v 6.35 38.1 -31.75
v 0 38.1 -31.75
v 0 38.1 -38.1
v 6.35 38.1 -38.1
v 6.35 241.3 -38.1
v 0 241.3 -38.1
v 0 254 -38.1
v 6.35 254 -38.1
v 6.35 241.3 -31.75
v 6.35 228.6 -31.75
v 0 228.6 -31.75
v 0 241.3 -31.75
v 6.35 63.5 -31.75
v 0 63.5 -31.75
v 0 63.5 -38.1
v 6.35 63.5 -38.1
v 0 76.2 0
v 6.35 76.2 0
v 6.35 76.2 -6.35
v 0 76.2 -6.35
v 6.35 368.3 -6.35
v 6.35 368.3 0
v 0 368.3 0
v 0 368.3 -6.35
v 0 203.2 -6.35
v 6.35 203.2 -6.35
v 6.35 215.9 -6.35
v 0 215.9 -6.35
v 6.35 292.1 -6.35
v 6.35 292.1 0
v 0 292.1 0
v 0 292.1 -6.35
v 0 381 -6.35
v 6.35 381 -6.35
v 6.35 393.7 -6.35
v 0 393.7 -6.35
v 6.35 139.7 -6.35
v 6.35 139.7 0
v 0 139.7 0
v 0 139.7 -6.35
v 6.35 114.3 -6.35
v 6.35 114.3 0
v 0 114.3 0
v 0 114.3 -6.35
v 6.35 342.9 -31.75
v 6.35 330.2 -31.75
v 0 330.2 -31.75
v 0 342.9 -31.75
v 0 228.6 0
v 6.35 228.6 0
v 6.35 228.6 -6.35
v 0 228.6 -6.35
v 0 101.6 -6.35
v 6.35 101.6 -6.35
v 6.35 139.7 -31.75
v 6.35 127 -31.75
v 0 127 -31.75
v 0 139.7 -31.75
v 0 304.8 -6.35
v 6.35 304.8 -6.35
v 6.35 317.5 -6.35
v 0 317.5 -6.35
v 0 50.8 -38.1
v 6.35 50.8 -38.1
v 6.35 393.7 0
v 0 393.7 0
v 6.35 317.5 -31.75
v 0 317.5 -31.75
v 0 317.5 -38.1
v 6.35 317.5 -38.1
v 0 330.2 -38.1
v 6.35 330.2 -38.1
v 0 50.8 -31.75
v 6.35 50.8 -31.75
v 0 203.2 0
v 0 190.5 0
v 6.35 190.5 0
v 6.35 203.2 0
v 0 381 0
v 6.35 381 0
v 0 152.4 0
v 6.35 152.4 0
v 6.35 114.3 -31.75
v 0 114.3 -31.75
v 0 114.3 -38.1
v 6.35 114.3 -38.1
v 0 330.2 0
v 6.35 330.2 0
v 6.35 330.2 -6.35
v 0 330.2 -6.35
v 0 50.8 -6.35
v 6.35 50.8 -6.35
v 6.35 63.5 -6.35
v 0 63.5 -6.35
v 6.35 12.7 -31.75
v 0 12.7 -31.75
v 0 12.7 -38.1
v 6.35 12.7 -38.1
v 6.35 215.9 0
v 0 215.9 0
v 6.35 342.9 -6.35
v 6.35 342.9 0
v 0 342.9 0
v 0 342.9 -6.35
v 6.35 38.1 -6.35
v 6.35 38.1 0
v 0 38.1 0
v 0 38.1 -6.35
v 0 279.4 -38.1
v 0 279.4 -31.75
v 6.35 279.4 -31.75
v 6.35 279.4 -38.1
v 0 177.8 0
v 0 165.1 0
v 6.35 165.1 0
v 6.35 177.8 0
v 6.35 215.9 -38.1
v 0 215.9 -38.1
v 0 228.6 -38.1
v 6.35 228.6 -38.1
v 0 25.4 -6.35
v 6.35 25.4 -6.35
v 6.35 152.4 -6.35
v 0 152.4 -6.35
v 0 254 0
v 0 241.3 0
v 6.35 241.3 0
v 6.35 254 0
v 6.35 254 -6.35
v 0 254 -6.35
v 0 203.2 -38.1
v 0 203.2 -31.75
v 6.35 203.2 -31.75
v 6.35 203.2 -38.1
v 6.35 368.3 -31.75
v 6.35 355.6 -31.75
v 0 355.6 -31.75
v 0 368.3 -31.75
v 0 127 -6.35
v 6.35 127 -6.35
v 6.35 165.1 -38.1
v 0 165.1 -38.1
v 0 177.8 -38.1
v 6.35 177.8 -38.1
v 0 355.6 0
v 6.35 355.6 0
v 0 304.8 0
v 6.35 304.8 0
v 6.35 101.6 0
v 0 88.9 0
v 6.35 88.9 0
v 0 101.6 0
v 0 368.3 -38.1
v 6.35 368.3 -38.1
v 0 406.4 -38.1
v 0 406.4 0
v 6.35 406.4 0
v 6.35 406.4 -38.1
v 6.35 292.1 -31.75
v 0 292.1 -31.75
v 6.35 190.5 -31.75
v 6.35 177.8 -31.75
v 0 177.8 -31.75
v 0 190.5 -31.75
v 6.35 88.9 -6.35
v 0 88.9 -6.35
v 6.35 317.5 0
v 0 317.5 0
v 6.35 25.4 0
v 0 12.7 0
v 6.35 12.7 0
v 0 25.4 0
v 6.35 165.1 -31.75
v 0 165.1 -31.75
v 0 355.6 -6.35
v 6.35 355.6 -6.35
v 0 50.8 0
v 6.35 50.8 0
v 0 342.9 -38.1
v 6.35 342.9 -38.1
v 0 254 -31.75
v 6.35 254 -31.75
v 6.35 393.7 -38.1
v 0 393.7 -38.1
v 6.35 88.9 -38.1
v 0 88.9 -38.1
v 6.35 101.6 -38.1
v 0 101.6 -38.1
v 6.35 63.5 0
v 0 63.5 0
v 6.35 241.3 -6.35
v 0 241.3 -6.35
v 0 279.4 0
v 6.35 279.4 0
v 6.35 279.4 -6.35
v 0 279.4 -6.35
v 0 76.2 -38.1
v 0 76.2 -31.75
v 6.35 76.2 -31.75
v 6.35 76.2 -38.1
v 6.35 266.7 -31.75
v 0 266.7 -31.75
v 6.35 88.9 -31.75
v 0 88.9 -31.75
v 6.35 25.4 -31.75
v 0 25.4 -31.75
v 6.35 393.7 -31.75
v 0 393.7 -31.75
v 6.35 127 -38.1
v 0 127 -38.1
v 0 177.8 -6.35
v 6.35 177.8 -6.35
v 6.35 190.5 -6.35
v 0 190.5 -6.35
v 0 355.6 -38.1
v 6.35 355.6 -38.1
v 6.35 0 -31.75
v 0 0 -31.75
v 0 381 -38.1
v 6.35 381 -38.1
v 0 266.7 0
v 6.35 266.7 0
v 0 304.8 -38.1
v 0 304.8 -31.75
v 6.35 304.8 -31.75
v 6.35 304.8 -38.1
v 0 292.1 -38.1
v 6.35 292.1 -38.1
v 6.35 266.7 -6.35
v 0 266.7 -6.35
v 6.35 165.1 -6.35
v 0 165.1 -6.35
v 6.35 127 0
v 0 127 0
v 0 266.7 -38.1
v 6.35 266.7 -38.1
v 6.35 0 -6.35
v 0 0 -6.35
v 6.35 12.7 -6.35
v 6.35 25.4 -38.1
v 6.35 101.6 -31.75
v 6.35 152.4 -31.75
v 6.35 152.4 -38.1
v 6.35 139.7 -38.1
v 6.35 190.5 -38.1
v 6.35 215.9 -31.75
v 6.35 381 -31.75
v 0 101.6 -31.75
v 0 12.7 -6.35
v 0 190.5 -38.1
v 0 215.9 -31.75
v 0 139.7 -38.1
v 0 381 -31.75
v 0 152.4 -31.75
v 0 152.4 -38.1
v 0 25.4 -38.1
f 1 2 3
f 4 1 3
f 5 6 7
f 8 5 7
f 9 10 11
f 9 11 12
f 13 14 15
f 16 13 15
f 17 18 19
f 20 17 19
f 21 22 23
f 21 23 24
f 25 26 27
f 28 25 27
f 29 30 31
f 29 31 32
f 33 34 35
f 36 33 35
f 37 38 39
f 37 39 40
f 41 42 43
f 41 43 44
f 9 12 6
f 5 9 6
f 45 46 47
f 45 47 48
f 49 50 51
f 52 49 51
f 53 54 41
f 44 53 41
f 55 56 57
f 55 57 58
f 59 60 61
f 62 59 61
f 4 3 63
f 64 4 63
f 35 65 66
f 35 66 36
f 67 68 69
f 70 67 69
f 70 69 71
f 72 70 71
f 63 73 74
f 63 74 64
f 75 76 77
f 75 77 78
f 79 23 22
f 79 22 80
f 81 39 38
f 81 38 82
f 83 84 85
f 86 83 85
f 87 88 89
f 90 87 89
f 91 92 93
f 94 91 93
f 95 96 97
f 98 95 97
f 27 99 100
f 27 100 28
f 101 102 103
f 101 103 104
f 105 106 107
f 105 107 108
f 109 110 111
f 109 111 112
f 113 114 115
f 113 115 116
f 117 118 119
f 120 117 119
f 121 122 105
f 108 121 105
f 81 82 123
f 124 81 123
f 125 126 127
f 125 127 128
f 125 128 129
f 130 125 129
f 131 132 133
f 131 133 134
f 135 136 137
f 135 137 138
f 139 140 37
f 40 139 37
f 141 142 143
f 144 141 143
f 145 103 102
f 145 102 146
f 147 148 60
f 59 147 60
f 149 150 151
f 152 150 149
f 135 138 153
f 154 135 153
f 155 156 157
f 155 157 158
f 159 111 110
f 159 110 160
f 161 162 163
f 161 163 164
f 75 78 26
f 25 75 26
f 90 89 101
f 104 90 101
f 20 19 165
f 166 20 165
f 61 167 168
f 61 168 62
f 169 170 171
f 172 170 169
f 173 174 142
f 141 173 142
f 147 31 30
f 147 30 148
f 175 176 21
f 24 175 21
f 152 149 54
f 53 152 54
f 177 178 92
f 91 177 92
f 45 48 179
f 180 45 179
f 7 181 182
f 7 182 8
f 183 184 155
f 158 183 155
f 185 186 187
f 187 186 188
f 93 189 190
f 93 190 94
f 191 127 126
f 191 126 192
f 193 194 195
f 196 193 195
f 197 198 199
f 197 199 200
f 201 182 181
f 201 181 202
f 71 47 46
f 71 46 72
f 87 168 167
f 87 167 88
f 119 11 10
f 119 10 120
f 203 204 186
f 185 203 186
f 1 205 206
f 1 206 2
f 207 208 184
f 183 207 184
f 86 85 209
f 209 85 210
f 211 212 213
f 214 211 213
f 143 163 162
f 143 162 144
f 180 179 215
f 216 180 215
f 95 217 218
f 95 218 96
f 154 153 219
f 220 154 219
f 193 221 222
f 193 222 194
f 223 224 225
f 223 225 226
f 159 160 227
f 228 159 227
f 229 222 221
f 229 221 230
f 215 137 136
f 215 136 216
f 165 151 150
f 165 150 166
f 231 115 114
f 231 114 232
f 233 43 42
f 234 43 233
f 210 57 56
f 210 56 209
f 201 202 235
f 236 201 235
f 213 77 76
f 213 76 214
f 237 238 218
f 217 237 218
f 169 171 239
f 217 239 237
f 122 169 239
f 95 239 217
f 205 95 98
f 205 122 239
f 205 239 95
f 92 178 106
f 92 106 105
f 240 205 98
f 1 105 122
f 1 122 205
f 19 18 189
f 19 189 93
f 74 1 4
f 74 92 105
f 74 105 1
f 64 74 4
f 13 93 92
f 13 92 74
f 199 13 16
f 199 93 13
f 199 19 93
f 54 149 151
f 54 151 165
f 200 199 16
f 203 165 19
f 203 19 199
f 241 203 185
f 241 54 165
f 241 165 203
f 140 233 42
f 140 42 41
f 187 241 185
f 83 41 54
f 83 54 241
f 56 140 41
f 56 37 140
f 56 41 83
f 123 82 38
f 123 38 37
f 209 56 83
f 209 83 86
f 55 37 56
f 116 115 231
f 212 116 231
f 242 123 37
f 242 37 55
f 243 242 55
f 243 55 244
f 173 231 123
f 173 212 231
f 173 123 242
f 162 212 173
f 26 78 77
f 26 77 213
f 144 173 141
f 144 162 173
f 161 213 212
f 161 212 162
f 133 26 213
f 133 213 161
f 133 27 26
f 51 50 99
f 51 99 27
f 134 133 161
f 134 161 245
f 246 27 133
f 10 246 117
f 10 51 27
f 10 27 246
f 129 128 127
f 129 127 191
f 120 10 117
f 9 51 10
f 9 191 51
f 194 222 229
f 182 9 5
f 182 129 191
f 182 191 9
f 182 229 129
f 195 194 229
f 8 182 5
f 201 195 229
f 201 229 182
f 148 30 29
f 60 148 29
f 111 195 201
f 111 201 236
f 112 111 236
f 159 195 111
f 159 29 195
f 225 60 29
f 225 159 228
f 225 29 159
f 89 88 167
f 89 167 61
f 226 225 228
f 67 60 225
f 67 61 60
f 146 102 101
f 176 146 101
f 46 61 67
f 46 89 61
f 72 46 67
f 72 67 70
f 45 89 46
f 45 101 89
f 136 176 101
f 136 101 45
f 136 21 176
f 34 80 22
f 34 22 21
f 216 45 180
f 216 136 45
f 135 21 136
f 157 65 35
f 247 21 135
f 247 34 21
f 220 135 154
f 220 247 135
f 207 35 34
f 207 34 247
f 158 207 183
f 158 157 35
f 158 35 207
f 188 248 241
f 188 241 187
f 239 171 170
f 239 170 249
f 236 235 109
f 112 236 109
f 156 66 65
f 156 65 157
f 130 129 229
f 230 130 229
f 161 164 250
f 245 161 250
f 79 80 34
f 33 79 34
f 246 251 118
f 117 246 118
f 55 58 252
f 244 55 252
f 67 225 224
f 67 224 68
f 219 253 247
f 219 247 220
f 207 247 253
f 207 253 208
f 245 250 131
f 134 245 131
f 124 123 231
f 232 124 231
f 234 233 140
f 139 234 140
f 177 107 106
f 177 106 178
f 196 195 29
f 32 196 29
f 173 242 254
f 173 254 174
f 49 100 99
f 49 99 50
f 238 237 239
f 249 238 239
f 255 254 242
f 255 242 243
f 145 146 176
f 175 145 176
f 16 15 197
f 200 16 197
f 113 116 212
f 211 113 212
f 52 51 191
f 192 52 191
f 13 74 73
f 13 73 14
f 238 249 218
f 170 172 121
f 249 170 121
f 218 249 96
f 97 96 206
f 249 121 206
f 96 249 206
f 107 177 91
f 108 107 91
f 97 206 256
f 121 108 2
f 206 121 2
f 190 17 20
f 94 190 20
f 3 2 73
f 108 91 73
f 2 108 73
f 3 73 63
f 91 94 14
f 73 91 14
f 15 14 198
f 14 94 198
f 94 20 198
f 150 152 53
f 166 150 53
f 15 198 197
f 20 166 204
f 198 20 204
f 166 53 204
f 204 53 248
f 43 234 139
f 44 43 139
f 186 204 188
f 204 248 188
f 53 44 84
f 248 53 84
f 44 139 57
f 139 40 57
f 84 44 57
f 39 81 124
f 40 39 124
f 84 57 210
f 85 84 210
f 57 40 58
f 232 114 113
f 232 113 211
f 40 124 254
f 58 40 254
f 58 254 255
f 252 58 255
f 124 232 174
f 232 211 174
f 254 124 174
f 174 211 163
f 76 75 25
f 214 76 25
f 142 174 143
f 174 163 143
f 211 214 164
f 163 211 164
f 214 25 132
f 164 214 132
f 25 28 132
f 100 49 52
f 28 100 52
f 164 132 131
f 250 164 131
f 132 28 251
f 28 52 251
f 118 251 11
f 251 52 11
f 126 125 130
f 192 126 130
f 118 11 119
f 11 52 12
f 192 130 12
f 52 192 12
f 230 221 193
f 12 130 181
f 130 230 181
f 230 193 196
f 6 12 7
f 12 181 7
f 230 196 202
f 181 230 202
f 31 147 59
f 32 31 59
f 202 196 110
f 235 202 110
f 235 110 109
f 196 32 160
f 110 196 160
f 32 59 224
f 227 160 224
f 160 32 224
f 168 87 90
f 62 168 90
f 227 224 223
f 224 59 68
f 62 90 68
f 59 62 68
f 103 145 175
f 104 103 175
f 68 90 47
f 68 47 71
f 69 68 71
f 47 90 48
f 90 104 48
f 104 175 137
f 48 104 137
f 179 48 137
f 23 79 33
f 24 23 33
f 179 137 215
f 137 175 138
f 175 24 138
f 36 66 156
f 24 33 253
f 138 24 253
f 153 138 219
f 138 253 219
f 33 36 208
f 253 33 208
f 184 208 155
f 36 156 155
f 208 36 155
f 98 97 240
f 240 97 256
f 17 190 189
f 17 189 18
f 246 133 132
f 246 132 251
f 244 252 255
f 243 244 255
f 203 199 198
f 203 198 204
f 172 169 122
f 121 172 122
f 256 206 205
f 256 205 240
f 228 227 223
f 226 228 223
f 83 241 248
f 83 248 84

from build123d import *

# Parameters (mm, degrees)
SKETCH1_W           = 38.1
SKETCH1_H           = 406.4
BOSS_EXTRUDE1_DEPTH = 6.35
SKETCH2_W           = 6.35
SKETCH2_H           = 12.7
CUT_EXTRUDE1_DEPTH  = 7.35
LPATTERN1_COUNT     = 16
LPATTERN1_PITCH     = 25.4


with BuildPart() as part:
    # Sketch1 → Boss-Extrude1 (new body)
    with BuildSketch(Plane(origin=(0, 0, 0), x_dir=(0, 0, -1), z_dir=(1, 0, 0))):
        with Locations((19.05, 203.2)):
            Rectangle(SKETCH1_W, SKETCH1_H)
    extrude(amount=BOSS_EXTRUDE1_DEPTH)

    # Sketch2 → Cut-Extrude1 (cut, through all)
    with BuildSketch(Plane(origin=(6.35, 0, 0), x_dir=(0, 0, -1), z_dir=(1, 0, 0))):
        with Locations((3.175, 6.35)):
            Rectangle(SKETCH2_W, SKETCH2_H)
        with Locations((34.925, 6.35)):
            Rectangle(SKETCH2_W, SKETCH2_H)
    cut_extrude1 = extrude(amount=-CUT_EXTRUDE1_DEPTH, mode=Mode.SUBTRACT)

    # LPattern1: Cut-Extrude1 ×16
    with Locations(*[(0, i * LPATTERN1_PITCH, 0) for i in range(1, LPATTERN1_COUNT)]):
        add(cut_extrude1, mode=Mode.SUBTRACT)


solid = part.part
